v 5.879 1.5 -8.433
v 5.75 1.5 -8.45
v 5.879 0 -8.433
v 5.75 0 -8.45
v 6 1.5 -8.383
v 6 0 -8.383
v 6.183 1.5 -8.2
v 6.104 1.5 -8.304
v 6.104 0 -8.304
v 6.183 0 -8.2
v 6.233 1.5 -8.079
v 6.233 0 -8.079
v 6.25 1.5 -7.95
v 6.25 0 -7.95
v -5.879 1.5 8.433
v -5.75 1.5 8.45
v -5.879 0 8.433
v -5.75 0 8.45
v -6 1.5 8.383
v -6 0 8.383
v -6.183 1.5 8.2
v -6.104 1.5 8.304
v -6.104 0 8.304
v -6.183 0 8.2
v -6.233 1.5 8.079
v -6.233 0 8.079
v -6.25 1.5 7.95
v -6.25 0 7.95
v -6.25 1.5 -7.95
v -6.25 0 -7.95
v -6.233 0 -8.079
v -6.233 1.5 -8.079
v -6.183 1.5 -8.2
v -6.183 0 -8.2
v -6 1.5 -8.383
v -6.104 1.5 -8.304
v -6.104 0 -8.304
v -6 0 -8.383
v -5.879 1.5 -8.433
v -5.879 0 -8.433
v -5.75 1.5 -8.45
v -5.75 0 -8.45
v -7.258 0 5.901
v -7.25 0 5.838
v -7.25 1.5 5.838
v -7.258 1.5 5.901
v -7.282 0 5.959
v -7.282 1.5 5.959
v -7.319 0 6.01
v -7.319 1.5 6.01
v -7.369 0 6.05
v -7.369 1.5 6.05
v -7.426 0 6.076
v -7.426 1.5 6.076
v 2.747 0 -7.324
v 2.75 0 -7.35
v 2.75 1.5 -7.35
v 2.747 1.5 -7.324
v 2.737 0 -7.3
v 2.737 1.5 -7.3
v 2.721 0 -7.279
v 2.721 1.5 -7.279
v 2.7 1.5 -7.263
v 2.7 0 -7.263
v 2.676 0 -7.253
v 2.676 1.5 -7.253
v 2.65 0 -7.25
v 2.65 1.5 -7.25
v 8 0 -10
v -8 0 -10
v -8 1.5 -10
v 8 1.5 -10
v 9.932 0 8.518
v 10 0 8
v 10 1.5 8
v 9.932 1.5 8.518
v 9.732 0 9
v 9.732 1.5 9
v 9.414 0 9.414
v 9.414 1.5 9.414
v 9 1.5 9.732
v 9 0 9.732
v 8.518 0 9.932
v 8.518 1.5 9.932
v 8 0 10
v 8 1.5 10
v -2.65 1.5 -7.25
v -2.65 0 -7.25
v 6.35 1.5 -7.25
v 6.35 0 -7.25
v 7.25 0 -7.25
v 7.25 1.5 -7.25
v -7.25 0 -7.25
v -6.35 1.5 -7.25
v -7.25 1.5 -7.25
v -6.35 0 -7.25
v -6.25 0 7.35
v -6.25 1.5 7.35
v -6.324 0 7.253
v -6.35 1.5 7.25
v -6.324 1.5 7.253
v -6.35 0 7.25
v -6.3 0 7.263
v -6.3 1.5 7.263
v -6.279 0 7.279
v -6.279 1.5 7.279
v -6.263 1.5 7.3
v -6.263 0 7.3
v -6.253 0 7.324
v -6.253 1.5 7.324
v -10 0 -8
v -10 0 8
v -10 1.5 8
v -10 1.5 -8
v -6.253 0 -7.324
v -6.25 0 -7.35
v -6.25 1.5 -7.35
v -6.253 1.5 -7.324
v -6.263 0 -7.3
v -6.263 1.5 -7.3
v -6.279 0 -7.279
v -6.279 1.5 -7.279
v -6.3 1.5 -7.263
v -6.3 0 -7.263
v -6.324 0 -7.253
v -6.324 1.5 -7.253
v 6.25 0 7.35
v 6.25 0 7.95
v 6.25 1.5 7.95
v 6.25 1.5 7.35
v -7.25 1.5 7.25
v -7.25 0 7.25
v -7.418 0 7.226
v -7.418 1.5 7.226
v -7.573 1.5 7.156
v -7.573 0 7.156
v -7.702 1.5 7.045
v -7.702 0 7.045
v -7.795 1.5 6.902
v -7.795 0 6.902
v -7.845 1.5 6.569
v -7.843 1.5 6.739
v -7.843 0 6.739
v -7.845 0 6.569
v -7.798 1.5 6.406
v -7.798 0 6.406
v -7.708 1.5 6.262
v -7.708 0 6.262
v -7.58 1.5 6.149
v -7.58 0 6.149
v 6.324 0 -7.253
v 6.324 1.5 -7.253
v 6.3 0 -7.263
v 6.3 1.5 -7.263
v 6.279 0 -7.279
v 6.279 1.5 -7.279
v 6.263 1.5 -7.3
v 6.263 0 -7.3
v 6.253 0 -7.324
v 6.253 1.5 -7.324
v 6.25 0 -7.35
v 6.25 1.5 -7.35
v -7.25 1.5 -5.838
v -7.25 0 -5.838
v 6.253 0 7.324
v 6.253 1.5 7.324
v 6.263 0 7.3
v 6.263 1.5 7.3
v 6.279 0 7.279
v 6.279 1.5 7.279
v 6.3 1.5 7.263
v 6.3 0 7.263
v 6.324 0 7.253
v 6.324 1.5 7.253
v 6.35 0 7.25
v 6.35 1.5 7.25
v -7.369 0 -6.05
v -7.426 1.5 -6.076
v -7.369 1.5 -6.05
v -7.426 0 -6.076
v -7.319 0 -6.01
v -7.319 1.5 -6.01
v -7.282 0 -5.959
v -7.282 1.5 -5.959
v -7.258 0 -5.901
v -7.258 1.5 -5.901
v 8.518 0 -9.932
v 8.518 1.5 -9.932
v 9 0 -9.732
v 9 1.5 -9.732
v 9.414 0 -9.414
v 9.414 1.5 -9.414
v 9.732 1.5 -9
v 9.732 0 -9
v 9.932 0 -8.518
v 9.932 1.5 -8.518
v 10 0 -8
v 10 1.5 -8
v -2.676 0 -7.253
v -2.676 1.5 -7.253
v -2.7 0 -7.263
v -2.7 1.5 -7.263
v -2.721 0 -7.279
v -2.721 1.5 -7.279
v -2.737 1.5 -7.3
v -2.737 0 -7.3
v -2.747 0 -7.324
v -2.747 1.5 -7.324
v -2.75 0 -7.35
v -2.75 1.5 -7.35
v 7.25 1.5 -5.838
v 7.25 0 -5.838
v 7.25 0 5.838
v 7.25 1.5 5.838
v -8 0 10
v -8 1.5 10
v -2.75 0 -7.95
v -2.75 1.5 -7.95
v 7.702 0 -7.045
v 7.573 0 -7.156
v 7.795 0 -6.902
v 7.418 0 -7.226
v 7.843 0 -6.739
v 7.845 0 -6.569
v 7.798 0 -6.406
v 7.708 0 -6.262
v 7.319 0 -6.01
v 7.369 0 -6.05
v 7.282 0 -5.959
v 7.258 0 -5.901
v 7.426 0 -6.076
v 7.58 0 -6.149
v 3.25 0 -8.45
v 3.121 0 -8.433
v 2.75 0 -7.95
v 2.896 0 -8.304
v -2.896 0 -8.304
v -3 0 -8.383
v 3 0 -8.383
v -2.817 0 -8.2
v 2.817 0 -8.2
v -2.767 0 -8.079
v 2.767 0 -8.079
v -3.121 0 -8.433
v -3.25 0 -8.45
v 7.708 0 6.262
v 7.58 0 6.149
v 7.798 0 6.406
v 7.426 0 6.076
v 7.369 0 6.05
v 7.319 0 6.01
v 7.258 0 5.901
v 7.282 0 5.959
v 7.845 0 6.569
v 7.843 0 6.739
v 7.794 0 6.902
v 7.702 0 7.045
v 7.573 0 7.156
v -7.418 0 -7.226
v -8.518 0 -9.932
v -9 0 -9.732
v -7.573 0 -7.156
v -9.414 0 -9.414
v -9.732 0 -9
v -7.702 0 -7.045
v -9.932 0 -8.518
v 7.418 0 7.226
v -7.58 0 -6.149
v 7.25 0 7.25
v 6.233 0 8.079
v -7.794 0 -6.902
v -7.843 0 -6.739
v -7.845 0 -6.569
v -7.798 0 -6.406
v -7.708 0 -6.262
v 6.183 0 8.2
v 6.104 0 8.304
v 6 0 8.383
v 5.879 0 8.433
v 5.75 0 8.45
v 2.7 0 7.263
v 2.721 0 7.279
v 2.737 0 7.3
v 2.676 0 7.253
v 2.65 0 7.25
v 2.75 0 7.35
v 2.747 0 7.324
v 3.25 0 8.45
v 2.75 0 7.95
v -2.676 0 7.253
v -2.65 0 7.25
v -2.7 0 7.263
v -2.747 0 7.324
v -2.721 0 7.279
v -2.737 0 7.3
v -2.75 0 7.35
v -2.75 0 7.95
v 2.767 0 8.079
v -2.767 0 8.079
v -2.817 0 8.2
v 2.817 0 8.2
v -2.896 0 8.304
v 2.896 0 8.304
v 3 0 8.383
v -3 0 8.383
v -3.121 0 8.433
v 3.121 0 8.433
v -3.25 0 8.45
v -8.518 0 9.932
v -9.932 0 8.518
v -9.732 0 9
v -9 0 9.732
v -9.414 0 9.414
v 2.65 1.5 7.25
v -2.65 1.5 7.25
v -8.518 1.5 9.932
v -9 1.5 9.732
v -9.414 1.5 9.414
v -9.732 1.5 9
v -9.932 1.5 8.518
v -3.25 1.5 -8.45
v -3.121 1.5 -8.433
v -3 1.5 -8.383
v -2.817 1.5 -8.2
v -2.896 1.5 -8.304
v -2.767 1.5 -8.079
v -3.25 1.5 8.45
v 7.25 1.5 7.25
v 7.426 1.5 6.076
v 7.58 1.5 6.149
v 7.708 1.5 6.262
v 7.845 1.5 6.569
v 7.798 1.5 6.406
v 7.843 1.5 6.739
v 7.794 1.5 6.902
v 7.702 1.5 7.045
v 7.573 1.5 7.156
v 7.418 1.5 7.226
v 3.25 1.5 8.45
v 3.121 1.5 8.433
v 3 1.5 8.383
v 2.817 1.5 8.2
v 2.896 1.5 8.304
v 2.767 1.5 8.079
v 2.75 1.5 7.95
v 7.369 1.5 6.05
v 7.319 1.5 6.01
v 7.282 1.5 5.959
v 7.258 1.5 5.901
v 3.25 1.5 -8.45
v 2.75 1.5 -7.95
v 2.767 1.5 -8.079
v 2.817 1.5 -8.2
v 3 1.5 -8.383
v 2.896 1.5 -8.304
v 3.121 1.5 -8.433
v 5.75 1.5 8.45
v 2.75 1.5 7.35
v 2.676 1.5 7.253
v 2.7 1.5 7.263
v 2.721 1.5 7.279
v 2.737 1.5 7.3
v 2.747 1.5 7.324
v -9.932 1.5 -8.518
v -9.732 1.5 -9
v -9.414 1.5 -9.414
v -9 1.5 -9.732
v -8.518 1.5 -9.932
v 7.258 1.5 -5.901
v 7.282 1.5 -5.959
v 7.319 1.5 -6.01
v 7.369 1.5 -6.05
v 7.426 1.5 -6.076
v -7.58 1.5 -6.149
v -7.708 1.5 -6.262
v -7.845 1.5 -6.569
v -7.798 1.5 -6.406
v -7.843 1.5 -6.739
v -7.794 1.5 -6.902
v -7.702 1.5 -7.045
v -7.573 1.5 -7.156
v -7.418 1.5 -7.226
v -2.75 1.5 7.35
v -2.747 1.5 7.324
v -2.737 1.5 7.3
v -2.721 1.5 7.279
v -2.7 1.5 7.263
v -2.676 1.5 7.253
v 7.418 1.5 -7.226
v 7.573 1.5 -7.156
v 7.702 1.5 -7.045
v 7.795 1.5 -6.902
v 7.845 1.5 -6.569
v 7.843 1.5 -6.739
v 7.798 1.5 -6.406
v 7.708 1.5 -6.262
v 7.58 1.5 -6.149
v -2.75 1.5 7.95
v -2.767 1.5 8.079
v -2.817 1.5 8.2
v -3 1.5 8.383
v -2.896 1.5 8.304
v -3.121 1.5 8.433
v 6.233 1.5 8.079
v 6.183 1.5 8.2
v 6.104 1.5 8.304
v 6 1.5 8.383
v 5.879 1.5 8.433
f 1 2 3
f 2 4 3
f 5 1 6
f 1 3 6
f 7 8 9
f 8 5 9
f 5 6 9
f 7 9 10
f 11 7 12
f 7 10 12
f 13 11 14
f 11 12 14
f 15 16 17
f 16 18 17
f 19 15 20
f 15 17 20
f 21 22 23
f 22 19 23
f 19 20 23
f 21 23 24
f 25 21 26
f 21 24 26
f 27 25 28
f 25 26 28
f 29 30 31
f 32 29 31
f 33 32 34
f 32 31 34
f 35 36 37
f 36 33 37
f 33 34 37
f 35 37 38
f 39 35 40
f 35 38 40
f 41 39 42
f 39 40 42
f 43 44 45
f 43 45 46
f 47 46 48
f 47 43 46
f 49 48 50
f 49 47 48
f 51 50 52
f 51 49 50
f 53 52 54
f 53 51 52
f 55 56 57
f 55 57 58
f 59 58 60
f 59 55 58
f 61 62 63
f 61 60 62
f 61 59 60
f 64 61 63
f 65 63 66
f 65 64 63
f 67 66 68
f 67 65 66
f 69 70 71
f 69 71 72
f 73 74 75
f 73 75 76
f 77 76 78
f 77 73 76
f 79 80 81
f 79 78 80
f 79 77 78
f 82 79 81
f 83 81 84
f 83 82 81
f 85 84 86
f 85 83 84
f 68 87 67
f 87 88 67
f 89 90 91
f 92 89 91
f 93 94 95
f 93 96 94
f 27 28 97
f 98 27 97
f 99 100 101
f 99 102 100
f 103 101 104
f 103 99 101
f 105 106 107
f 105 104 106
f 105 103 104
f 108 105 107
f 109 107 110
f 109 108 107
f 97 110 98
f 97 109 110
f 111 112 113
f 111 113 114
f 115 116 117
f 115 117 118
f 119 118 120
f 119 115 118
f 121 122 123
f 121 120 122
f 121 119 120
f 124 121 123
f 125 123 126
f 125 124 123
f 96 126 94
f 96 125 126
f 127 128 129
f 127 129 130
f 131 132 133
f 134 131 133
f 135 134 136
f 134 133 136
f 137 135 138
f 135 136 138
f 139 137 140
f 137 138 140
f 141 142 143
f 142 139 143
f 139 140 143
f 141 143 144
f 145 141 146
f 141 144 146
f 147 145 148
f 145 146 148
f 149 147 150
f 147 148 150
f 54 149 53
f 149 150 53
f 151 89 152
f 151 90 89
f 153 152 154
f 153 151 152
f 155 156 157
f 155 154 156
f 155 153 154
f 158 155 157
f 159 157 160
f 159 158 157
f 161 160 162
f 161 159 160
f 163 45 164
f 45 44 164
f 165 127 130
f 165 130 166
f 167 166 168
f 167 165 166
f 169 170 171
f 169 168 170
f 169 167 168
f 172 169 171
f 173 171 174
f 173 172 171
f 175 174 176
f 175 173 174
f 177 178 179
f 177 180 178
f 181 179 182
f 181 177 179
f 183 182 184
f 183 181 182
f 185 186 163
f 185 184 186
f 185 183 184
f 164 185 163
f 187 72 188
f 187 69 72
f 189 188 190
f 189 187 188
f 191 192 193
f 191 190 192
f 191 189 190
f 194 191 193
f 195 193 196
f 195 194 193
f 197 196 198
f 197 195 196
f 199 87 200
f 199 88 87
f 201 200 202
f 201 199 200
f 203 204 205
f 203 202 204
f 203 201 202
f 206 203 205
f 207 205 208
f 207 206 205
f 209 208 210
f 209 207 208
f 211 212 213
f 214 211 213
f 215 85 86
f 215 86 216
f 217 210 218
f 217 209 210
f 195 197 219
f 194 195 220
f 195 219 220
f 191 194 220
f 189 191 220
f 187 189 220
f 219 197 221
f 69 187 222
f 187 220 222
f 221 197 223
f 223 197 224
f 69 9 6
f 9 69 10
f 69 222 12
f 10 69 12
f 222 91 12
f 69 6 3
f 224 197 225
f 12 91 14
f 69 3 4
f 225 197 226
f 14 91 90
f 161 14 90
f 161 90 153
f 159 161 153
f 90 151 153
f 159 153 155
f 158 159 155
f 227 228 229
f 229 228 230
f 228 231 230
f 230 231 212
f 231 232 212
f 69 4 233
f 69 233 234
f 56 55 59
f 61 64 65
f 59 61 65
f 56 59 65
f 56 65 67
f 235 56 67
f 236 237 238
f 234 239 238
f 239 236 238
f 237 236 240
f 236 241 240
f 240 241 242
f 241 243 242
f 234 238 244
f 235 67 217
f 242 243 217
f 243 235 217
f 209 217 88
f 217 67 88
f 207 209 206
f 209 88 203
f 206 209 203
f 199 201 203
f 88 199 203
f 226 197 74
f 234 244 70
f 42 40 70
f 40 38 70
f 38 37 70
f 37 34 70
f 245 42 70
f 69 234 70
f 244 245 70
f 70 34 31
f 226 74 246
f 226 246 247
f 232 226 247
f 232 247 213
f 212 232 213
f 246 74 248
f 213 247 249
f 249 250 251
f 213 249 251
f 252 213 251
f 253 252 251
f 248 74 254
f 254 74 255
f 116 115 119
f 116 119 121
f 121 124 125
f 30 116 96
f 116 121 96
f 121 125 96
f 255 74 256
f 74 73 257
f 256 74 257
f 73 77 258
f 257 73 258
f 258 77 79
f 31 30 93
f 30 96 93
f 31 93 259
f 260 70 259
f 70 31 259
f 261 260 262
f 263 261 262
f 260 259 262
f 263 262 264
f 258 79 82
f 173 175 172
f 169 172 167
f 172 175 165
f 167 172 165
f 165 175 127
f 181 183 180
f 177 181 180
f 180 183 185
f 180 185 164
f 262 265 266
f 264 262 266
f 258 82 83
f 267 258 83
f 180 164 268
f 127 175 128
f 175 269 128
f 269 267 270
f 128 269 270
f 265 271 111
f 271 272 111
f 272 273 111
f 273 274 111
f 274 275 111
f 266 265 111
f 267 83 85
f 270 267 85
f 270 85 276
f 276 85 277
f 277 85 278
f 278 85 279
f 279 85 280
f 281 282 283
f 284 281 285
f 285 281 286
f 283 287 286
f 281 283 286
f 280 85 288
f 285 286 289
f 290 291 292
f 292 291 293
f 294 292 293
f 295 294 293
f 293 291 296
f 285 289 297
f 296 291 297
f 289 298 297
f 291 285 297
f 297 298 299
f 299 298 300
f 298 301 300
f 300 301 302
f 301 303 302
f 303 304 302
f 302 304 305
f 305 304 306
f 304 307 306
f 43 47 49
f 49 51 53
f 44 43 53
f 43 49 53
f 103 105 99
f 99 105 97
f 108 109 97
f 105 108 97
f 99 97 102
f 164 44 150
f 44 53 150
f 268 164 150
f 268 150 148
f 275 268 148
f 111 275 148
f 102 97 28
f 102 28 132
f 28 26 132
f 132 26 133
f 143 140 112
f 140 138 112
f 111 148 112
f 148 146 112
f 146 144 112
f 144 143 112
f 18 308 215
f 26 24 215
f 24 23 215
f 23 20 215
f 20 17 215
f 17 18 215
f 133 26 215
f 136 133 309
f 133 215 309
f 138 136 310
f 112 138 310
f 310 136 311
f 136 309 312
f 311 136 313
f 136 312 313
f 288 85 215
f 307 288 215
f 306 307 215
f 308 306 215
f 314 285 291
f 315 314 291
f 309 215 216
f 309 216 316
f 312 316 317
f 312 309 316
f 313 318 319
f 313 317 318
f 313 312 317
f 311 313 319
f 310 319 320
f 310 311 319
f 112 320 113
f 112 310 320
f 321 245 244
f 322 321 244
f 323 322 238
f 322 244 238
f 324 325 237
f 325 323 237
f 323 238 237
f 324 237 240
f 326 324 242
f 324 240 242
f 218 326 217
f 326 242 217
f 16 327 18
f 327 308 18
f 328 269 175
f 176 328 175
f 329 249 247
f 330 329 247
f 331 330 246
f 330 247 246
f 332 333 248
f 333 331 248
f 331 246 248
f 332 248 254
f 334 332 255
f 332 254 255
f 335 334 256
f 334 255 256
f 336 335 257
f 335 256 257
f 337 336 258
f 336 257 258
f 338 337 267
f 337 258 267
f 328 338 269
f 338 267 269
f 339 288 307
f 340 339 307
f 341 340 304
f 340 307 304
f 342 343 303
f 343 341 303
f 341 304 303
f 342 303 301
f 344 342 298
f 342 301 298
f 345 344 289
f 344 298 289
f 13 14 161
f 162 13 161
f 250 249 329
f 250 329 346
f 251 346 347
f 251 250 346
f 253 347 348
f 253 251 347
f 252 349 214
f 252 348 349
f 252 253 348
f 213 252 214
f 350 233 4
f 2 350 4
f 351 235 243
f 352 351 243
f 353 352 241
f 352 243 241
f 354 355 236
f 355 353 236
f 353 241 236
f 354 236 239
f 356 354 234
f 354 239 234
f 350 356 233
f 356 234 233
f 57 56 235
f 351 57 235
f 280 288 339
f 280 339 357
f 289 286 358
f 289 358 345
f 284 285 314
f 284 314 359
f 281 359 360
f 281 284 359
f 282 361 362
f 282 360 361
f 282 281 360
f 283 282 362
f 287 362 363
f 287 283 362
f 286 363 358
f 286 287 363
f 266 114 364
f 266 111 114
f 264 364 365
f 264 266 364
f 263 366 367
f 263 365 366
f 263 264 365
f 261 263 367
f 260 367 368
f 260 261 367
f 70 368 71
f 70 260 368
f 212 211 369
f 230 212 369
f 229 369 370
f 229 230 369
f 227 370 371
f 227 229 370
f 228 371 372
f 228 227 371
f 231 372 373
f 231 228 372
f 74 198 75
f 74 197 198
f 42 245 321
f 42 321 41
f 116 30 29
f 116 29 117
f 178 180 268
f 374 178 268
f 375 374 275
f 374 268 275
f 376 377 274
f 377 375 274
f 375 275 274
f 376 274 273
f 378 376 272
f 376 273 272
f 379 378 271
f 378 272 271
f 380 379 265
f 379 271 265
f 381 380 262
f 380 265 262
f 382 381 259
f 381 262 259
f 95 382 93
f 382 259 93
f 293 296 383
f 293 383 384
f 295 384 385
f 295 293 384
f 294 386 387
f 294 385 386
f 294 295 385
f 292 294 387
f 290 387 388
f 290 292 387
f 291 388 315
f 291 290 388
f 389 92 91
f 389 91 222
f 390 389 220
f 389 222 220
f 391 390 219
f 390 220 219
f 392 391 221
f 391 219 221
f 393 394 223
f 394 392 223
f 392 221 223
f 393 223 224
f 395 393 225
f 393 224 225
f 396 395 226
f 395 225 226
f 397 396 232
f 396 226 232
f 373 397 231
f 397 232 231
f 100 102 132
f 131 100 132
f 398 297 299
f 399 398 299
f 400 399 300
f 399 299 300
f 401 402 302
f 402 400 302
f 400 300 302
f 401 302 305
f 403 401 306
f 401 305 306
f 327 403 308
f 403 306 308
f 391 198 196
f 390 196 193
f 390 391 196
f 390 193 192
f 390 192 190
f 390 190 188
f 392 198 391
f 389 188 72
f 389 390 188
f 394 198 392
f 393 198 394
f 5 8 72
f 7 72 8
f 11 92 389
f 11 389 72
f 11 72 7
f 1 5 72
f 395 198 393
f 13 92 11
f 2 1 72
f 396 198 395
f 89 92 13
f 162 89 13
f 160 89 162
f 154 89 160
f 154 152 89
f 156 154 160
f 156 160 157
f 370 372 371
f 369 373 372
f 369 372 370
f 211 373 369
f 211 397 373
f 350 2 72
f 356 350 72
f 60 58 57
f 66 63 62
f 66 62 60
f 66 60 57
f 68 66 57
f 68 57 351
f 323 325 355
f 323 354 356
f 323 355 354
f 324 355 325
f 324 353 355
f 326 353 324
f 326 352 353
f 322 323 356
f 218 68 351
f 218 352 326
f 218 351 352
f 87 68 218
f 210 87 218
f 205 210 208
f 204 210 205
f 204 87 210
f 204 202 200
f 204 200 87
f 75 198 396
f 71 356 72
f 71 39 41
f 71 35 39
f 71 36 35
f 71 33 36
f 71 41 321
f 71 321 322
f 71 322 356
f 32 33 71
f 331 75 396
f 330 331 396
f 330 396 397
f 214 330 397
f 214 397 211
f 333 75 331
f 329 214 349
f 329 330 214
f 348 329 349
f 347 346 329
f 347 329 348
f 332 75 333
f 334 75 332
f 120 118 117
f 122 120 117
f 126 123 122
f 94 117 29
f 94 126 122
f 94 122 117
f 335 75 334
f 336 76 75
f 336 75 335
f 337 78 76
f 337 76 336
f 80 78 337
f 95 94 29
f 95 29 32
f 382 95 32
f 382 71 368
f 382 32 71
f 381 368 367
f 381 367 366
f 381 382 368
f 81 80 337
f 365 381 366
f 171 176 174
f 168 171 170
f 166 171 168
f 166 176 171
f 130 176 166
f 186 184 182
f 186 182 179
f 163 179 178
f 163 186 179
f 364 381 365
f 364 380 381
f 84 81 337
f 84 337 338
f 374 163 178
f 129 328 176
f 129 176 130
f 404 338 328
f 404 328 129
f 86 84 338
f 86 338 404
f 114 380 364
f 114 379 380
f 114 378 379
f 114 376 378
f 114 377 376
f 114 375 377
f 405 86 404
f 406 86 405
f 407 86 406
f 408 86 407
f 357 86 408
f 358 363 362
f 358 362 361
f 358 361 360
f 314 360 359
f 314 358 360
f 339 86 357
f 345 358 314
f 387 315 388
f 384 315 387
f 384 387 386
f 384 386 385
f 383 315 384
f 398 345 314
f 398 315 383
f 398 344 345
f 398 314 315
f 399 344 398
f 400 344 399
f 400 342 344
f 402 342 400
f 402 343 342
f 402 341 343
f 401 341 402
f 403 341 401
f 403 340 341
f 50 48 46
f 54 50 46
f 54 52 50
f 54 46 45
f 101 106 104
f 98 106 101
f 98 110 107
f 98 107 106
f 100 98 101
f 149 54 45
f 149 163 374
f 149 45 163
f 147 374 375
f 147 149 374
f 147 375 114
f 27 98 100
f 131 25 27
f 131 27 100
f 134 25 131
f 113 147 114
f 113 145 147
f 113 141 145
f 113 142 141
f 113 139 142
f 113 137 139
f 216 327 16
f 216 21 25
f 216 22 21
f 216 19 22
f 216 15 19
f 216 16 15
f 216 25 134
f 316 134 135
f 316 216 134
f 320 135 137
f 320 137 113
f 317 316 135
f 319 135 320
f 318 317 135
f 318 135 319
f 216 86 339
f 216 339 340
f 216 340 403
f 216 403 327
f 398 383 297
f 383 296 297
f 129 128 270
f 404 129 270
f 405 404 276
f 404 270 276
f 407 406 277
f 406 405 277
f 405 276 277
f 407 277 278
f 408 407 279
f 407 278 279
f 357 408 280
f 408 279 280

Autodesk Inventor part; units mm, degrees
ref_plane "YZ Plane" through (0, 0, 0) normal (1, 0, 0) x (0, 1, 0)
ref_plane "XZ Plane" through (0, 0, 0) normal (0, 1, 0) x (-1, 0, 0)
ref_plane "XY Plane" through (0, 0, 0) normal (0, 0, 1) x (1, 0, 0)
sketch "Sketch1" plane through (0, 0, 0) normal (0, 1, 0) x (-1, 0, 0)
  line L0 (7.25, 5.8376) -> (7.25, -5.8376)
  line L1 (-7.25, -5.8376) -> (-7.25, 5.8376)
  line L2 (-7.25, 7.25) -> (7.25, -7.25) construction
  line L3 (7.25, 7.25) -> (-7.25, -7.25) construction
  line L4 (6.25, 7.25) -> (2.75, 7.25) construction
  line L5 (2.75, 7.35) -> (2.75, 7.95)
  line L6 (3.25, 8.45) -> (5.75, 8.45)
  line L7 (6.25, 7.95) -> (6.25, 7.35)
  arc A0 (7.4265, 6.0765) -> (7.25, 7.25) centre (7.25, 6.65) ccw
  line L8 (-7.25, 7.25) -> (2.65, 7.25)
  line L9 (6.35, 7.25) -> (7.25, 7.25)
  arc A1 (6.25, 7.35) -> (6.35, 7.25) centre (6.35, 7.35) ccw
  arc A2 (2.65, 7.25) -> (2.75, 7.35) centre (2.65, 7.35) ccw
  arc A3 (6.25, 7.95) -> (5.75, 8.45) centre (5.75, 7.95) ccw
  arc A4 (3.25, 8.45) -> (2.75, 7.95) centre (3.25, 7.95) ccw
  arc A5 (7.4265, 6.0765) -> (7.25, 5.8376) centre (7.5, 5.8376) ccw
  line L10 (0, 0) -> (2.8942, 0)
  line L11 (0, 0) -> (0, -4.9214)
  line L12 (7.25, -7.25) -> (-7.25, 7.25) construction
  line L13 (6.25, -7.25) -> (2.75, -7.25) construction
  line L14 (2.75, -7.35) -> (2.75, -7.95)
  line L15 (3.25, -8.45) -> (5.75, -8.45)
  line L16 (6.25, -7.95) -> (6.25, -7.35)
  arc A6 (7.25, -7.25) -> (7.4265, -6.0765) centre (7.25, -6.65) ccw
  line L17 (6.35, -7.25) -> (7.25, -7.25)
  arc A7 (6.35, -7.25) -> (6.25, -7.35) centre (6.35, -7.35) ccw
  arc A8 (2.75, -7.35) -> (2.65, -7.25) centre (2.65, -7.35) ccw
  arc A9 (5.75, -8.45) -> (6.25, -7.95) centre (5.75, -7.95) ccw
  arc A10 (2.75, -7.95) -> (3.25, -8.45) centre (3.25, -7.95) ccw
  arc A11 (7.25, -5.8376) -> (7.4265, -6.0765) centre (7.5, -5.8376) ccw
  line L18 (7.25, -7.25) -> (6.35, -7.25)
  line L19 (-6.25, 7.25) -> (-2.75, 7.25) construction
  line L20 (-2.75, 7.35) -> (-2.75, 7.95)
  line L21 (-3.25, 8.45) -> (-5.75, 8.45)
  line L22 (-6.25, 7.95) -> (-6.25, 7.35)
  arc A12 (-7.25, 7.25) -> (-7.4265, 6.0765) centre (-7.25, 6.65) ccw
  line L23 (-6.35, 7.25) -> (-7.25, 7.25)
  arc A13 (-6.35, 7.25) -> (-6.25, 7.35) centre (-6.35, 7.35) ccw
  arc A14 (-2.75, 7.35) -> (-2.65, 7.25) centre (-2.65, 7.35) ccw
  arc A15 (-5.75, 8.45) -> (-6.25, 7.95) centre (-5.75, 7.95) ccw
  arc A16 (-2.75, 7.95) -> (-3.25, 8.45) centre (-3.25, 7.95) ccw
  arc A17 (-7.25, 5.8376) -> (-7.4265, 6.0765) centre (-7.5, 5.8376) ccw
  arc A18 (-7.4265, -6.0765) -> (-7.25, -5.8376) centre (-7.5, -5.8376) ccw
  arc A19 (-7.4265, -6.0765) -> (-7.25, -7.25) centre (-7.25, -6.65) ccw
  line L24 (-6.35, -7.25) -> (-7.25, -7.25)
  line L25 (-7.25, -7.25) -> (7.25, 7.25) construction
  arc A20 (-6.25, -7.35) -> (-6.35, -7.25) centre (-6.35, -7.35) ccw
  line L26 (-6.25, -7.95) -> (-6.25, -7.35)
  arc A21 (-6.25, -7.95) -> (-5.75, -8.45) centre (-5.75, -7.95) ccw
  line L27 (-6.25, -7.25) -> (-2.75, -7.25) construction
  line L28 (-3.25, -8.45) -> (-5.75, -8.45)
  arc A22 (-2.65, -7.25) -> (-2.75, -7.35) centre (-2.65, -7.35) ccw
  line L29 (-2.75, -7.35) -> (-2.75, -7.95)
  arc A23 (-3.25, -8.45) -> (-2.75, -7.95) centre (-3.25, -7.95) ccw
  line L30 (-7.25, -7.25) -> (-6.35, -7.25)
  line L31 (2.65, -7.25) -> (-2.65, -7.25)
  line L32 (-6.35, -7.25) -> (-7.25, -7.25)
  line L33 (8, -10) -> (-8, -10)
  line L34 (-10, -8) -> (-10, 8)
  line L35 (-8, 10) -> (8, 10)
  line L36 (10, 8) -> (10, -8)
  arc A24 (10, 8) -> (8, 10) centre (8, 8) ccw
  arc A25 (8, -10) -> (10, -8) centre (8, -8) ccw
  arc A26 (-10, -8) -> (-8, -10) centre (-8, -8) ccw
  arc A27 (-8, 10) -> (-10, 8) centre (-8, 8) ccw
  point P0 (2.75, 8.45)
  point P1 (6.25, 8.45)
  point P2 (6.25, 7.65)
  point P3 (7.25, 6.05)
  point P4 (2.75, -8.45)
  point P5 (6.25, -8.45)
  point P6 (6.25, -7.65)
  point P7 (7.25, -6.05)
  point P8 (-2.75, 8.45)
  point P9 (-6.25, 8.45)
  point P10 (-6.25, 7.65)
  point P11 (-7.25, 6.05)
  point P12 (-7.25, -6.05)
  point P13 (-6.25, -7.65)
  point P14 (-6.25, -8.45)
  point P15 (-2.75, -8.45)
  point P16 (10, -10)
  point P17 (-10, -10)
  point P18 (-10, 10)
  point P19 (10, 10)
  point P20 (-7.25, 7.25)
  point P21 (-6.35, 7.25)
  point P22 (-2.65, 7.25)
  dimension "d0" = 14.5
  dimension "d1" = 14.5
  dimension "d2" = 3.5
  dimension "d3" = 1.2
  dimension "d4" = 1
  dimension "d5" = 1.2
  dimension "d6" = 0.1
  dimension "d7" = 0.1
  dimension "d8" = 0.5
  dimension "d9" = 0.25
  dimension "d10" = 2
  dimension "d13" = 20
  dimension "d14" = 20
extrude "Extrusion1" add sketch "Sketch1" along normal blind 1.5
properties part number "test switch hole"
